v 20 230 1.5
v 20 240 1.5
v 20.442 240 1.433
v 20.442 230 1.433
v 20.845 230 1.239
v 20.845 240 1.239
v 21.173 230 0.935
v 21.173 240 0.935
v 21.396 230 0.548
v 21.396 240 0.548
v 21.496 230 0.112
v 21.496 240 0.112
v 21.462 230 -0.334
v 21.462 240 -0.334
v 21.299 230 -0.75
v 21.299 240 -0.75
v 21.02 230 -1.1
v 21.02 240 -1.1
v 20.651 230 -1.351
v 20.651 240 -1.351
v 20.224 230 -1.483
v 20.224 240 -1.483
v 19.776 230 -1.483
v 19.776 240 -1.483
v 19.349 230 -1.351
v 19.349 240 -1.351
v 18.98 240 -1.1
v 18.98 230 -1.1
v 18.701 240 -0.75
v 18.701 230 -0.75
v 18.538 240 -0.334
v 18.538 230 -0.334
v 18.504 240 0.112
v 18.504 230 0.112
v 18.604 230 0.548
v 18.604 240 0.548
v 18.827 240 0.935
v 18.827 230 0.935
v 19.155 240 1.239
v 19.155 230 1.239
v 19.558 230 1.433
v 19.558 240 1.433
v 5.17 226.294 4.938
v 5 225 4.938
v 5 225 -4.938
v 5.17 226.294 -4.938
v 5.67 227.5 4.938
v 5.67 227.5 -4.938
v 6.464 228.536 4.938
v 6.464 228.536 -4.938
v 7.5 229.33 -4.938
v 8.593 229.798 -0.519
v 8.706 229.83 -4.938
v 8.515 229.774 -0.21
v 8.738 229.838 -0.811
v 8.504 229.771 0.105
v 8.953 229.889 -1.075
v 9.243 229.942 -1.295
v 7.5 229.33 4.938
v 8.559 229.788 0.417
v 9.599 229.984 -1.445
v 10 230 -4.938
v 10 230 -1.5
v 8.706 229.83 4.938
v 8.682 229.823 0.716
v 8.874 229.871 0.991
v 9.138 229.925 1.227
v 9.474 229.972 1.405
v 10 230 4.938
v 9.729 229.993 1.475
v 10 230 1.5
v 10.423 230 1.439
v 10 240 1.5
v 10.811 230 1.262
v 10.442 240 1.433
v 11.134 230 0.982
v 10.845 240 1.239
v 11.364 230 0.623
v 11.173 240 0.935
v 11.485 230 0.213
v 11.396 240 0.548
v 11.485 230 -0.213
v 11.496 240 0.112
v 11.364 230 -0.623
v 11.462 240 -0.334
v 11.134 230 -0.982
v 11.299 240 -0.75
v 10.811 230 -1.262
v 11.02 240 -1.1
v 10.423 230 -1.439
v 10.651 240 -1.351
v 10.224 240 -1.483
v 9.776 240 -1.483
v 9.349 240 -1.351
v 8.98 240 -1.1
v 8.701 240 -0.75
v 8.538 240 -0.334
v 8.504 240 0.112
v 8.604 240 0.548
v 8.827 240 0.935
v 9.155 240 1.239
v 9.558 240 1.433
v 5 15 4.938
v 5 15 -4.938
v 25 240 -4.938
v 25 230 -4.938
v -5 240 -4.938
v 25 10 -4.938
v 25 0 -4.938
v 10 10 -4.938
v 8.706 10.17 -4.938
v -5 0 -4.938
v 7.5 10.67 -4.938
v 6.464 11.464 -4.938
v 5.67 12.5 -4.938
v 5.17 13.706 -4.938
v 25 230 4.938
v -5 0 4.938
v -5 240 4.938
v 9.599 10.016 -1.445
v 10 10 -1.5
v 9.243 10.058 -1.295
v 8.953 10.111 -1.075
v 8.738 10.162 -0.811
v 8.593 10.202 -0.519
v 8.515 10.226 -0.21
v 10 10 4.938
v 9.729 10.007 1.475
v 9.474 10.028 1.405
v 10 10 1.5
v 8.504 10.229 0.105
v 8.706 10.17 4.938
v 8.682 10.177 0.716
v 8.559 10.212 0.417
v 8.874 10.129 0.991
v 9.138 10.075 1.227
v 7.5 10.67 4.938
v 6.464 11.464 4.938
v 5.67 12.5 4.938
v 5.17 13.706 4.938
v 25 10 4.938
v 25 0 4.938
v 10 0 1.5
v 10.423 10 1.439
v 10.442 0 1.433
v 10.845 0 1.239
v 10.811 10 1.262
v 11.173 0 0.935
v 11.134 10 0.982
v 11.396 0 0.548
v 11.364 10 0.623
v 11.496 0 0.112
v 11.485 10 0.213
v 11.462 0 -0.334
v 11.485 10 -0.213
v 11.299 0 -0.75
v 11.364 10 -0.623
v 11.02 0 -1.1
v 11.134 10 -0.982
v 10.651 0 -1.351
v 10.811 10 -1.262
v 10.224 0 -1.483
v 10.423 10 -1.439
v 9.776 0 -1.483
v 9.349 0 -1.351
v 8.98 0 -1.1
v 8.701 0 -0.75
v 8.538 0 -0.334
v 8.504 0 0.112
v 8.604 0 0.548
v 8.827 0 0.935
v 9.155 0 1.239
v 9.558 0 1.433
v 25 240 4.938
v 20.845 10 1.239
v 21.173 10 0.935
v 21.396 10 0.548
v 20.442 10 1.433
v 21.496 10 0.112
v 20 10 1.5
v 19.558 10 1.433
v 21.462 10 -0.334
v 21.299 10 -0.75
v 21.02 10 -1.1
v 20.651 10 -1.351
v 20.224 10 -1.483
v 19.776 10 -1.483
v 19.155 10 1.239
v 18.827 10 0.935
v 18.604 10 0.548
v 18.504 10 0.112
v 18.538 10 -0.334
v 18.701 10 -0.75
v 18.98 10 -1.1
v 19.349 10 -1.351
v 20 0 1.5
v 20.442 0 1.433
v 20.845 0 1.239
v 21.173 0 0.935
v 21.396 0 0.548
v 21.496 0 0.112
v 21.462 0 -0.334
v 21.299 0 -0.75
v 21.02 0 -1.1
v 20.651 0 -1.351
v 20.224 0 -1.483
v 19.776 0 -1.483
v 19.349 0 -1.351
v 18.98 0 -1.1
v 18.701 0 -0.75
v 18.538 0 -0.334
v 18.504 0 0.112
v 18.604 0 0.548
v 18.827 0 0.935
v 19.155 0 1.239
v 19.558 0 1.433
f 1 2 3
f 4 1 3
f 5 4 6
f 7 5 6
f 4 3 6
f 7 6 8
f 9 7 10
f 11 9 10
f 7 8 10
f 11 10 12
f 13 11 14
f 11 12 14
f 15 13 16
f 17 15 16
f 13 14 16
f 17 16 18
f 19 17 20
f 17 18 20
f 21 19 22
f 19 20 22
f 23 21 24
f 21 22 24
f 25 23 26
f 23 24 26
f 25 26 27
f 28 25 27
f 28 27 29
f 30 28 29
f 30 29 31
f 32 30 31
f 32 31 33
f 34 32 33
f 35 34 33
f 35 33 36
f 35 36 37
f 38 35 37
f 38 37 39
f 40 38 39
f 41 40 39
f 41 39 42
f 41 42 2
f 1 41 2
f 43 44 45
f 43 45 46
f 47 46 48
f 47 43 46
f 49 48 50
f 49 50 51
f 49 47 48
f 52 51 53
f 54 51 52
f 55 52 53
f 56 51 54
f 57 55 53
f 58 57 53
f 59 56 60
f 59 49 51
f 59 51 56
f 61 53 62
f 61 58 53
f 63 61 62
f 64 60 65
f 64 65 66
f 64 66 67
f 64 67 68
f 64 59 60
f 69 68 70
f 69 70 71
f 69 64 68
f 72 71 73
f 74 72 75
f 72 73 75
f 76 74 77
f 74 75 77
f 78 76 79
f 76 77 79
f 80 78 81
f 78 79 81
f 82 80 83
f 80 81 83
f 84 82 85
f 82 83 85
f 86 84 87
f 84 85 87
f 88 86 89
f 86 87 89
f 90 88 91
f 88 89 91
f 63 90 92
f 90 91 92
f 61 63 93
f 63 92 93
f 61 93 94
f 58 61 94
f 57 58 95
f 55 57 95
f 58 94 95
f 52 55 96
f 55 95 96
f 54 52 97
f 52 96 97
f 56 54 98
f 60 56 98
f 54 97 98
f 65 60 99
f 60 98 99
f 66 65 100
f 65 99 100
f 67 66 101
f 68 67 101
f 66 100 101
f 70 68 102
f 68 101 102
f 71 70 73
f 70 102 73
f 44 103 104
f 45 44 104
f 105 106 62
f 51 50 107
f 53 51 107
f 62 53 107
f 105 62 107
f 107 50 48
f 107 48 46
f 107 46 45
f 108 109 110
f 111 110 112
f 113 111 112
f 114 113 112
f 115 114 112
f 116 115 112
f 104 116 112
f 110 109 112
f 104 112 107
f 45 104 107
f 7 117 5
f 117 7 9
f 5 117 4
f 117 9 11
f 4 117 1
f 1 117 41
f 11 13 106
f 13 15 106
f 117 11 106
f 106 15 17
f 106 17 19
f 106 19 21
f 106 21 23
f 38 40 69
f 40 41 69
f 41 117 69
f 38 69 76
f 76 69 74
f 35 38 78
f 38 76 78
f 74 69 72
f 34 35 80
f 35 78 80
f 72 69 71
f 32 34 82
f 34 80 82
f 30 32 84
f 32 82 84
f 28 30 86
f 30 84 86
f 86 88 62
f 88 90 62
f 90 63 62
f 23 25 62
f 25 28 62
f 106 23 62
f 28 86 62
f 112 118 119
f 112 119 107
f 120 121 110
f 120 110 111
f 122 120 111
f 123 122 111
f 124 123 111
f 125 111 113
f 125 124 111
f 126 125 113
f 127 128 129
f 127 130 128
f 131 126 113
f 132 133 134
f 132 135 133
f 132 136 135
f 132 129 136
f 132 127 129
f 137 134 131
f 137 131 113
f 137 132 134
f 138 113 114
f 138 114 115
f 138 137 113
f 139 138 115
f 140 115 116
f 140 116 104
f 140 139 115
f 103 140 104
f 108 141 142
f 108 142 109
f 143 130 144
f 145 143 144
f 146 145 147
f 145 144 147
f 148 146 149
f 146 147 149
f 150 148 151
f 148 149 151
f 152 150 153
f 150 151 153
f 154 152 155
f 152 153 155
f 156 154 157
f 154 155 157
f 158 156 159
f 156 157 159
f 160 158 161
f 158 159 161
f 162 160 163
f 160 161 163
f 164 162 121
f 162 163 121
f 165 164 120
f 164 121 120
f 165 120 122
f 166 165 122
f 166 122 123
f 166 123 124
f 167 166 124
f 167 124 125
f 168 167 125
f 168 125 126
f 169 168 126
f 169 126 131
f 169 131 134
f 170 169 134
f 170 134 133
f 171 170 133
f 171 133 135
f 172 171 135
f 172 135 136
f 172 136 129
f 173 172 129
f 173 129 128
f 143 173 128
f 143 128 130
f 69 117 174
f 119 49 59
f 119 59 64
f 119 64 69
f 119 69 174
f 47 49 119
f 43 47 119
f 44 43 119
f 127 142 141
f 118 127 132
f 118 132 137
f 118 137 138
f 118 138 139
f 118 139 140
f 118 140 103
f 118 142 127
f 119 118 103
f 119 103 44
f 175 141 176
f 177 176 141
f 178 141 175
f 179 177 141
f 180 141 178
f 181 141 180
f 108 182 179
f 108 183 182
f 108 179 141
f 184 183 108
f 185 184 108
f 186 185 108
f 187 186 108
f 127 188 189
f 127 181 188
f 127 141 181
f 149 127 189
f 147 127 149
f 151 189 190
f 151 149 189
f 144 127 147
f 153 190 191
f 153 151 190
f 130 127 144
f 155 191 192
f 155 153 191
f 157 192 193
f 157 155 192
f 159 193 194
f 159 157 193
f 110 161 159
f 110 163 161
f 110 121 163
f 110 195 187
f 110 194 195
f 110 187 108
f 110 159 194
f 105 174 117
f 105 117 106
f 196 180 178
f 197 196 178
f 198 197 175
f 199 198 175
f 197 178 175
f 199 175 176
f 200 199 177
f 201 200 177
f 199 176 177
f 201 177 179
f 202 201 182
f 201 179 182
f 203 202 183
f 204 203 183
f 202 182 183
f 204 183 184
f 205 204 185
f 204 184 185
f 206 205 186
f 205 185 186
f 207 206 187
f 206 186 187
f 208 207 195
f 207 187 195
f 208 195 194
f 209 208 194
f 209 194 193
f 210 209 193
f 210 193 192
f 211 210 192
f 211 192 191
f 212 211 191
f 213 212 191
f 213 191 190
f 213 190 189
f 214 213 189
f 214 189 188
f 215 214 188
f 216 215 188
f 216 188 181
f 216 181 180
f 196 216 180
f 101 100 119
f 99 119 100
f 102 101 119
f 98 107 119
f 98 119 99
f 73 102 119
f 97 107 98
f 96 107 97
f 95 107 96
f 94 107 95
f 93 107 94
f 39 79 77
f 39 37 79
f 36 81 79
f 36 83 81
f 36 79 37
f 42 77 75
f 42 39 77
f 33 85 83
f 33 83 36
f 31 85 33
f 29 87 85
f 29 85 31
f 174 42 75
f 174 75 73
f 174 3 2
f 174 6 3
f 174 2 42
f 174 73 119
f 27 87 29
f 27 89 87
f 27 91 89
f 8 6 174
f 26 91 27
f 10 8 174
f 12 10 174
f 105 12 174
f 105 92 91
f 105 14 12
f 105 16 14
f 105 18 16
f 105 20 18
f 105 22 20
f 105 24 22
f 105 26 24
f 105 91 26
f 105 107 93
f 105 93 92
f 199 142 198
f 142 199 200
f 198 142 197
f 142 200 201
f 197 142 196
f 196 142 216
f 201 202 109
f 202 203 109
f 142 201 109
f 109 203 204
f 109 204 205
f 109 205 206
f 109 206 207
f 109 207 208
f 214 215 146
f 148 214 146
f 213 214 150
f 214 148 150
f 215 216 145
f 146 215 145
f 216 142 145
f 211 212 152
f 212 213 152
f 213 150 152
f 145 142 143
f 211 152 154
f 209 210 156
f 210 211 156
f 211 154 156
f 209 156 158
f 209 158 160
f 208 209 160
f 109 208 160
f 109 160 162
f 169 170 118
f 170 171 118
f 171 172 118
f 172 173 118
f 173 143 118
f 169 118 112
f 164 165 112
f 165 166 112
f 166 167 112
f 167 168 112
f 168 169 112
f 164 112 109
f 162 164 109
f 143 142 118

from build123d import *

# Parameters (mm, degrees)
SKETCH1_W           = 10
SKETCH1_H           = 9.875
BOSS_EXTRUDE1_DEPTH = 240
SKETCH2_W           = 9.875
SKETCH2_H           = 10
BOSS_EXTRUDE2_DEPTH = 20
SKETCH3_R           = 1.5
CUT_EXTRUDE1_DEPTH  = 242.349081014
FILLET1_R           = 5


with BuildPart() as part:
    # Sketch1 → Boss-Extrude1 (new body)
    with BuildSketch(Plane(origin=(0, 0, 0), x_dir=(1, 0, 0), z_dir=(0, 1, 0))):
        Rectangle(SKETCH1_W, SKETCH1_H)
    extrude(amount=BOSS_EXTRUDE1_DEPTH)

    # Sketch2 → Boss-Extrude2 (add)
    with BuildSketch(Plane(origin=(5, 0, 0), x_dir=(0, 0, -1), z_dir=(1, 0, 0))):
        with Locations((0, 5)):
            Rectangle(SKETCH2_W, SKETCH2_H)
        with Locations((0, 235)):
            Rectangle(SKETCH2_W, SKETCH2_H)
    extrude(amount=BOSS_EXTRUDE2_DEPTH)

    # Sketch3 → Cut-Extrude1 (cut, through all)
    with BuildSketch(Plane(origin=(0, 240, 0), x_dir=(1, 0, 0), z_dir=(0, 1, 0))):
        with Locations(Location((10, 0, 0), (0, 0, 270))):
            Circle(SKETCH3_R)
        with Locations(Location((20, 0, 0), (0, 0, 270))):
            Circle(SKETCH3_R)
    extrude(amount=-CUT_EXTRUDE1_DEPTH, mode=Mode.SUBTRACT)

    # Fillet1
    # the kernel refuses this fillet: 5 mm, written as the material it adds along each edge
    with BuildSketch(Plane(origin=(5, 10, 4.9375), x_dir=(0, 1, 0), z_dir=(0, 0, -1))) as fillet1_piece_1_section:
        with BuildLine():
            CenterArc((FILLET1_R, FILLET1_R), FILLET1_R, 180, 90)
            Line((0, FILLET1_R), (0, 0))
            Line((0, 0), (FILLET1_R, 0))
        make_face()
    fillet1_piece_1 = extrude(amount=9.875, mode=Mode.PRIVATE)
    fillet1_piece_1 = fillet1_piece_1 - Plane(origin=(10, 11.142134011, 0), x_dir=(0, 0, 1), z_dir=(0, 1, 0)) * Cylinder(1.5, 40, mode=Mode.PRIVATE)
    add(fillet1_piece_1)
    with BuildSketch(Plane(origin=(5, 230, 4.9375), x_dir=(1, 0, 0), z_dir=(0, 0, -1))) as fillet1_piece_2_section:
        with BuildLine():
            CenterArc((FILLET1_R, FILLET1_R), FILLET1_R, 180, 90)
            Line((0, FILLET1_R), (0, 0))
            Line((0, 0), (FILLET1_R, 0))
        make_face()
    fillet1_piece_2 = extrude(amount=9.875, mode=Mode.PRIVATE)
    fillet1_piece_2 = fillet1_piece_2 - Plane(origin=(10, 228.857865929, 0), x_dir=(0, 0, 1), z_dir=(0, 1, 0)) * Cylinder(1.5, 40, mode=Mode.PRIVATE)
    add(fillet1_piece_2)


solid = part.part
